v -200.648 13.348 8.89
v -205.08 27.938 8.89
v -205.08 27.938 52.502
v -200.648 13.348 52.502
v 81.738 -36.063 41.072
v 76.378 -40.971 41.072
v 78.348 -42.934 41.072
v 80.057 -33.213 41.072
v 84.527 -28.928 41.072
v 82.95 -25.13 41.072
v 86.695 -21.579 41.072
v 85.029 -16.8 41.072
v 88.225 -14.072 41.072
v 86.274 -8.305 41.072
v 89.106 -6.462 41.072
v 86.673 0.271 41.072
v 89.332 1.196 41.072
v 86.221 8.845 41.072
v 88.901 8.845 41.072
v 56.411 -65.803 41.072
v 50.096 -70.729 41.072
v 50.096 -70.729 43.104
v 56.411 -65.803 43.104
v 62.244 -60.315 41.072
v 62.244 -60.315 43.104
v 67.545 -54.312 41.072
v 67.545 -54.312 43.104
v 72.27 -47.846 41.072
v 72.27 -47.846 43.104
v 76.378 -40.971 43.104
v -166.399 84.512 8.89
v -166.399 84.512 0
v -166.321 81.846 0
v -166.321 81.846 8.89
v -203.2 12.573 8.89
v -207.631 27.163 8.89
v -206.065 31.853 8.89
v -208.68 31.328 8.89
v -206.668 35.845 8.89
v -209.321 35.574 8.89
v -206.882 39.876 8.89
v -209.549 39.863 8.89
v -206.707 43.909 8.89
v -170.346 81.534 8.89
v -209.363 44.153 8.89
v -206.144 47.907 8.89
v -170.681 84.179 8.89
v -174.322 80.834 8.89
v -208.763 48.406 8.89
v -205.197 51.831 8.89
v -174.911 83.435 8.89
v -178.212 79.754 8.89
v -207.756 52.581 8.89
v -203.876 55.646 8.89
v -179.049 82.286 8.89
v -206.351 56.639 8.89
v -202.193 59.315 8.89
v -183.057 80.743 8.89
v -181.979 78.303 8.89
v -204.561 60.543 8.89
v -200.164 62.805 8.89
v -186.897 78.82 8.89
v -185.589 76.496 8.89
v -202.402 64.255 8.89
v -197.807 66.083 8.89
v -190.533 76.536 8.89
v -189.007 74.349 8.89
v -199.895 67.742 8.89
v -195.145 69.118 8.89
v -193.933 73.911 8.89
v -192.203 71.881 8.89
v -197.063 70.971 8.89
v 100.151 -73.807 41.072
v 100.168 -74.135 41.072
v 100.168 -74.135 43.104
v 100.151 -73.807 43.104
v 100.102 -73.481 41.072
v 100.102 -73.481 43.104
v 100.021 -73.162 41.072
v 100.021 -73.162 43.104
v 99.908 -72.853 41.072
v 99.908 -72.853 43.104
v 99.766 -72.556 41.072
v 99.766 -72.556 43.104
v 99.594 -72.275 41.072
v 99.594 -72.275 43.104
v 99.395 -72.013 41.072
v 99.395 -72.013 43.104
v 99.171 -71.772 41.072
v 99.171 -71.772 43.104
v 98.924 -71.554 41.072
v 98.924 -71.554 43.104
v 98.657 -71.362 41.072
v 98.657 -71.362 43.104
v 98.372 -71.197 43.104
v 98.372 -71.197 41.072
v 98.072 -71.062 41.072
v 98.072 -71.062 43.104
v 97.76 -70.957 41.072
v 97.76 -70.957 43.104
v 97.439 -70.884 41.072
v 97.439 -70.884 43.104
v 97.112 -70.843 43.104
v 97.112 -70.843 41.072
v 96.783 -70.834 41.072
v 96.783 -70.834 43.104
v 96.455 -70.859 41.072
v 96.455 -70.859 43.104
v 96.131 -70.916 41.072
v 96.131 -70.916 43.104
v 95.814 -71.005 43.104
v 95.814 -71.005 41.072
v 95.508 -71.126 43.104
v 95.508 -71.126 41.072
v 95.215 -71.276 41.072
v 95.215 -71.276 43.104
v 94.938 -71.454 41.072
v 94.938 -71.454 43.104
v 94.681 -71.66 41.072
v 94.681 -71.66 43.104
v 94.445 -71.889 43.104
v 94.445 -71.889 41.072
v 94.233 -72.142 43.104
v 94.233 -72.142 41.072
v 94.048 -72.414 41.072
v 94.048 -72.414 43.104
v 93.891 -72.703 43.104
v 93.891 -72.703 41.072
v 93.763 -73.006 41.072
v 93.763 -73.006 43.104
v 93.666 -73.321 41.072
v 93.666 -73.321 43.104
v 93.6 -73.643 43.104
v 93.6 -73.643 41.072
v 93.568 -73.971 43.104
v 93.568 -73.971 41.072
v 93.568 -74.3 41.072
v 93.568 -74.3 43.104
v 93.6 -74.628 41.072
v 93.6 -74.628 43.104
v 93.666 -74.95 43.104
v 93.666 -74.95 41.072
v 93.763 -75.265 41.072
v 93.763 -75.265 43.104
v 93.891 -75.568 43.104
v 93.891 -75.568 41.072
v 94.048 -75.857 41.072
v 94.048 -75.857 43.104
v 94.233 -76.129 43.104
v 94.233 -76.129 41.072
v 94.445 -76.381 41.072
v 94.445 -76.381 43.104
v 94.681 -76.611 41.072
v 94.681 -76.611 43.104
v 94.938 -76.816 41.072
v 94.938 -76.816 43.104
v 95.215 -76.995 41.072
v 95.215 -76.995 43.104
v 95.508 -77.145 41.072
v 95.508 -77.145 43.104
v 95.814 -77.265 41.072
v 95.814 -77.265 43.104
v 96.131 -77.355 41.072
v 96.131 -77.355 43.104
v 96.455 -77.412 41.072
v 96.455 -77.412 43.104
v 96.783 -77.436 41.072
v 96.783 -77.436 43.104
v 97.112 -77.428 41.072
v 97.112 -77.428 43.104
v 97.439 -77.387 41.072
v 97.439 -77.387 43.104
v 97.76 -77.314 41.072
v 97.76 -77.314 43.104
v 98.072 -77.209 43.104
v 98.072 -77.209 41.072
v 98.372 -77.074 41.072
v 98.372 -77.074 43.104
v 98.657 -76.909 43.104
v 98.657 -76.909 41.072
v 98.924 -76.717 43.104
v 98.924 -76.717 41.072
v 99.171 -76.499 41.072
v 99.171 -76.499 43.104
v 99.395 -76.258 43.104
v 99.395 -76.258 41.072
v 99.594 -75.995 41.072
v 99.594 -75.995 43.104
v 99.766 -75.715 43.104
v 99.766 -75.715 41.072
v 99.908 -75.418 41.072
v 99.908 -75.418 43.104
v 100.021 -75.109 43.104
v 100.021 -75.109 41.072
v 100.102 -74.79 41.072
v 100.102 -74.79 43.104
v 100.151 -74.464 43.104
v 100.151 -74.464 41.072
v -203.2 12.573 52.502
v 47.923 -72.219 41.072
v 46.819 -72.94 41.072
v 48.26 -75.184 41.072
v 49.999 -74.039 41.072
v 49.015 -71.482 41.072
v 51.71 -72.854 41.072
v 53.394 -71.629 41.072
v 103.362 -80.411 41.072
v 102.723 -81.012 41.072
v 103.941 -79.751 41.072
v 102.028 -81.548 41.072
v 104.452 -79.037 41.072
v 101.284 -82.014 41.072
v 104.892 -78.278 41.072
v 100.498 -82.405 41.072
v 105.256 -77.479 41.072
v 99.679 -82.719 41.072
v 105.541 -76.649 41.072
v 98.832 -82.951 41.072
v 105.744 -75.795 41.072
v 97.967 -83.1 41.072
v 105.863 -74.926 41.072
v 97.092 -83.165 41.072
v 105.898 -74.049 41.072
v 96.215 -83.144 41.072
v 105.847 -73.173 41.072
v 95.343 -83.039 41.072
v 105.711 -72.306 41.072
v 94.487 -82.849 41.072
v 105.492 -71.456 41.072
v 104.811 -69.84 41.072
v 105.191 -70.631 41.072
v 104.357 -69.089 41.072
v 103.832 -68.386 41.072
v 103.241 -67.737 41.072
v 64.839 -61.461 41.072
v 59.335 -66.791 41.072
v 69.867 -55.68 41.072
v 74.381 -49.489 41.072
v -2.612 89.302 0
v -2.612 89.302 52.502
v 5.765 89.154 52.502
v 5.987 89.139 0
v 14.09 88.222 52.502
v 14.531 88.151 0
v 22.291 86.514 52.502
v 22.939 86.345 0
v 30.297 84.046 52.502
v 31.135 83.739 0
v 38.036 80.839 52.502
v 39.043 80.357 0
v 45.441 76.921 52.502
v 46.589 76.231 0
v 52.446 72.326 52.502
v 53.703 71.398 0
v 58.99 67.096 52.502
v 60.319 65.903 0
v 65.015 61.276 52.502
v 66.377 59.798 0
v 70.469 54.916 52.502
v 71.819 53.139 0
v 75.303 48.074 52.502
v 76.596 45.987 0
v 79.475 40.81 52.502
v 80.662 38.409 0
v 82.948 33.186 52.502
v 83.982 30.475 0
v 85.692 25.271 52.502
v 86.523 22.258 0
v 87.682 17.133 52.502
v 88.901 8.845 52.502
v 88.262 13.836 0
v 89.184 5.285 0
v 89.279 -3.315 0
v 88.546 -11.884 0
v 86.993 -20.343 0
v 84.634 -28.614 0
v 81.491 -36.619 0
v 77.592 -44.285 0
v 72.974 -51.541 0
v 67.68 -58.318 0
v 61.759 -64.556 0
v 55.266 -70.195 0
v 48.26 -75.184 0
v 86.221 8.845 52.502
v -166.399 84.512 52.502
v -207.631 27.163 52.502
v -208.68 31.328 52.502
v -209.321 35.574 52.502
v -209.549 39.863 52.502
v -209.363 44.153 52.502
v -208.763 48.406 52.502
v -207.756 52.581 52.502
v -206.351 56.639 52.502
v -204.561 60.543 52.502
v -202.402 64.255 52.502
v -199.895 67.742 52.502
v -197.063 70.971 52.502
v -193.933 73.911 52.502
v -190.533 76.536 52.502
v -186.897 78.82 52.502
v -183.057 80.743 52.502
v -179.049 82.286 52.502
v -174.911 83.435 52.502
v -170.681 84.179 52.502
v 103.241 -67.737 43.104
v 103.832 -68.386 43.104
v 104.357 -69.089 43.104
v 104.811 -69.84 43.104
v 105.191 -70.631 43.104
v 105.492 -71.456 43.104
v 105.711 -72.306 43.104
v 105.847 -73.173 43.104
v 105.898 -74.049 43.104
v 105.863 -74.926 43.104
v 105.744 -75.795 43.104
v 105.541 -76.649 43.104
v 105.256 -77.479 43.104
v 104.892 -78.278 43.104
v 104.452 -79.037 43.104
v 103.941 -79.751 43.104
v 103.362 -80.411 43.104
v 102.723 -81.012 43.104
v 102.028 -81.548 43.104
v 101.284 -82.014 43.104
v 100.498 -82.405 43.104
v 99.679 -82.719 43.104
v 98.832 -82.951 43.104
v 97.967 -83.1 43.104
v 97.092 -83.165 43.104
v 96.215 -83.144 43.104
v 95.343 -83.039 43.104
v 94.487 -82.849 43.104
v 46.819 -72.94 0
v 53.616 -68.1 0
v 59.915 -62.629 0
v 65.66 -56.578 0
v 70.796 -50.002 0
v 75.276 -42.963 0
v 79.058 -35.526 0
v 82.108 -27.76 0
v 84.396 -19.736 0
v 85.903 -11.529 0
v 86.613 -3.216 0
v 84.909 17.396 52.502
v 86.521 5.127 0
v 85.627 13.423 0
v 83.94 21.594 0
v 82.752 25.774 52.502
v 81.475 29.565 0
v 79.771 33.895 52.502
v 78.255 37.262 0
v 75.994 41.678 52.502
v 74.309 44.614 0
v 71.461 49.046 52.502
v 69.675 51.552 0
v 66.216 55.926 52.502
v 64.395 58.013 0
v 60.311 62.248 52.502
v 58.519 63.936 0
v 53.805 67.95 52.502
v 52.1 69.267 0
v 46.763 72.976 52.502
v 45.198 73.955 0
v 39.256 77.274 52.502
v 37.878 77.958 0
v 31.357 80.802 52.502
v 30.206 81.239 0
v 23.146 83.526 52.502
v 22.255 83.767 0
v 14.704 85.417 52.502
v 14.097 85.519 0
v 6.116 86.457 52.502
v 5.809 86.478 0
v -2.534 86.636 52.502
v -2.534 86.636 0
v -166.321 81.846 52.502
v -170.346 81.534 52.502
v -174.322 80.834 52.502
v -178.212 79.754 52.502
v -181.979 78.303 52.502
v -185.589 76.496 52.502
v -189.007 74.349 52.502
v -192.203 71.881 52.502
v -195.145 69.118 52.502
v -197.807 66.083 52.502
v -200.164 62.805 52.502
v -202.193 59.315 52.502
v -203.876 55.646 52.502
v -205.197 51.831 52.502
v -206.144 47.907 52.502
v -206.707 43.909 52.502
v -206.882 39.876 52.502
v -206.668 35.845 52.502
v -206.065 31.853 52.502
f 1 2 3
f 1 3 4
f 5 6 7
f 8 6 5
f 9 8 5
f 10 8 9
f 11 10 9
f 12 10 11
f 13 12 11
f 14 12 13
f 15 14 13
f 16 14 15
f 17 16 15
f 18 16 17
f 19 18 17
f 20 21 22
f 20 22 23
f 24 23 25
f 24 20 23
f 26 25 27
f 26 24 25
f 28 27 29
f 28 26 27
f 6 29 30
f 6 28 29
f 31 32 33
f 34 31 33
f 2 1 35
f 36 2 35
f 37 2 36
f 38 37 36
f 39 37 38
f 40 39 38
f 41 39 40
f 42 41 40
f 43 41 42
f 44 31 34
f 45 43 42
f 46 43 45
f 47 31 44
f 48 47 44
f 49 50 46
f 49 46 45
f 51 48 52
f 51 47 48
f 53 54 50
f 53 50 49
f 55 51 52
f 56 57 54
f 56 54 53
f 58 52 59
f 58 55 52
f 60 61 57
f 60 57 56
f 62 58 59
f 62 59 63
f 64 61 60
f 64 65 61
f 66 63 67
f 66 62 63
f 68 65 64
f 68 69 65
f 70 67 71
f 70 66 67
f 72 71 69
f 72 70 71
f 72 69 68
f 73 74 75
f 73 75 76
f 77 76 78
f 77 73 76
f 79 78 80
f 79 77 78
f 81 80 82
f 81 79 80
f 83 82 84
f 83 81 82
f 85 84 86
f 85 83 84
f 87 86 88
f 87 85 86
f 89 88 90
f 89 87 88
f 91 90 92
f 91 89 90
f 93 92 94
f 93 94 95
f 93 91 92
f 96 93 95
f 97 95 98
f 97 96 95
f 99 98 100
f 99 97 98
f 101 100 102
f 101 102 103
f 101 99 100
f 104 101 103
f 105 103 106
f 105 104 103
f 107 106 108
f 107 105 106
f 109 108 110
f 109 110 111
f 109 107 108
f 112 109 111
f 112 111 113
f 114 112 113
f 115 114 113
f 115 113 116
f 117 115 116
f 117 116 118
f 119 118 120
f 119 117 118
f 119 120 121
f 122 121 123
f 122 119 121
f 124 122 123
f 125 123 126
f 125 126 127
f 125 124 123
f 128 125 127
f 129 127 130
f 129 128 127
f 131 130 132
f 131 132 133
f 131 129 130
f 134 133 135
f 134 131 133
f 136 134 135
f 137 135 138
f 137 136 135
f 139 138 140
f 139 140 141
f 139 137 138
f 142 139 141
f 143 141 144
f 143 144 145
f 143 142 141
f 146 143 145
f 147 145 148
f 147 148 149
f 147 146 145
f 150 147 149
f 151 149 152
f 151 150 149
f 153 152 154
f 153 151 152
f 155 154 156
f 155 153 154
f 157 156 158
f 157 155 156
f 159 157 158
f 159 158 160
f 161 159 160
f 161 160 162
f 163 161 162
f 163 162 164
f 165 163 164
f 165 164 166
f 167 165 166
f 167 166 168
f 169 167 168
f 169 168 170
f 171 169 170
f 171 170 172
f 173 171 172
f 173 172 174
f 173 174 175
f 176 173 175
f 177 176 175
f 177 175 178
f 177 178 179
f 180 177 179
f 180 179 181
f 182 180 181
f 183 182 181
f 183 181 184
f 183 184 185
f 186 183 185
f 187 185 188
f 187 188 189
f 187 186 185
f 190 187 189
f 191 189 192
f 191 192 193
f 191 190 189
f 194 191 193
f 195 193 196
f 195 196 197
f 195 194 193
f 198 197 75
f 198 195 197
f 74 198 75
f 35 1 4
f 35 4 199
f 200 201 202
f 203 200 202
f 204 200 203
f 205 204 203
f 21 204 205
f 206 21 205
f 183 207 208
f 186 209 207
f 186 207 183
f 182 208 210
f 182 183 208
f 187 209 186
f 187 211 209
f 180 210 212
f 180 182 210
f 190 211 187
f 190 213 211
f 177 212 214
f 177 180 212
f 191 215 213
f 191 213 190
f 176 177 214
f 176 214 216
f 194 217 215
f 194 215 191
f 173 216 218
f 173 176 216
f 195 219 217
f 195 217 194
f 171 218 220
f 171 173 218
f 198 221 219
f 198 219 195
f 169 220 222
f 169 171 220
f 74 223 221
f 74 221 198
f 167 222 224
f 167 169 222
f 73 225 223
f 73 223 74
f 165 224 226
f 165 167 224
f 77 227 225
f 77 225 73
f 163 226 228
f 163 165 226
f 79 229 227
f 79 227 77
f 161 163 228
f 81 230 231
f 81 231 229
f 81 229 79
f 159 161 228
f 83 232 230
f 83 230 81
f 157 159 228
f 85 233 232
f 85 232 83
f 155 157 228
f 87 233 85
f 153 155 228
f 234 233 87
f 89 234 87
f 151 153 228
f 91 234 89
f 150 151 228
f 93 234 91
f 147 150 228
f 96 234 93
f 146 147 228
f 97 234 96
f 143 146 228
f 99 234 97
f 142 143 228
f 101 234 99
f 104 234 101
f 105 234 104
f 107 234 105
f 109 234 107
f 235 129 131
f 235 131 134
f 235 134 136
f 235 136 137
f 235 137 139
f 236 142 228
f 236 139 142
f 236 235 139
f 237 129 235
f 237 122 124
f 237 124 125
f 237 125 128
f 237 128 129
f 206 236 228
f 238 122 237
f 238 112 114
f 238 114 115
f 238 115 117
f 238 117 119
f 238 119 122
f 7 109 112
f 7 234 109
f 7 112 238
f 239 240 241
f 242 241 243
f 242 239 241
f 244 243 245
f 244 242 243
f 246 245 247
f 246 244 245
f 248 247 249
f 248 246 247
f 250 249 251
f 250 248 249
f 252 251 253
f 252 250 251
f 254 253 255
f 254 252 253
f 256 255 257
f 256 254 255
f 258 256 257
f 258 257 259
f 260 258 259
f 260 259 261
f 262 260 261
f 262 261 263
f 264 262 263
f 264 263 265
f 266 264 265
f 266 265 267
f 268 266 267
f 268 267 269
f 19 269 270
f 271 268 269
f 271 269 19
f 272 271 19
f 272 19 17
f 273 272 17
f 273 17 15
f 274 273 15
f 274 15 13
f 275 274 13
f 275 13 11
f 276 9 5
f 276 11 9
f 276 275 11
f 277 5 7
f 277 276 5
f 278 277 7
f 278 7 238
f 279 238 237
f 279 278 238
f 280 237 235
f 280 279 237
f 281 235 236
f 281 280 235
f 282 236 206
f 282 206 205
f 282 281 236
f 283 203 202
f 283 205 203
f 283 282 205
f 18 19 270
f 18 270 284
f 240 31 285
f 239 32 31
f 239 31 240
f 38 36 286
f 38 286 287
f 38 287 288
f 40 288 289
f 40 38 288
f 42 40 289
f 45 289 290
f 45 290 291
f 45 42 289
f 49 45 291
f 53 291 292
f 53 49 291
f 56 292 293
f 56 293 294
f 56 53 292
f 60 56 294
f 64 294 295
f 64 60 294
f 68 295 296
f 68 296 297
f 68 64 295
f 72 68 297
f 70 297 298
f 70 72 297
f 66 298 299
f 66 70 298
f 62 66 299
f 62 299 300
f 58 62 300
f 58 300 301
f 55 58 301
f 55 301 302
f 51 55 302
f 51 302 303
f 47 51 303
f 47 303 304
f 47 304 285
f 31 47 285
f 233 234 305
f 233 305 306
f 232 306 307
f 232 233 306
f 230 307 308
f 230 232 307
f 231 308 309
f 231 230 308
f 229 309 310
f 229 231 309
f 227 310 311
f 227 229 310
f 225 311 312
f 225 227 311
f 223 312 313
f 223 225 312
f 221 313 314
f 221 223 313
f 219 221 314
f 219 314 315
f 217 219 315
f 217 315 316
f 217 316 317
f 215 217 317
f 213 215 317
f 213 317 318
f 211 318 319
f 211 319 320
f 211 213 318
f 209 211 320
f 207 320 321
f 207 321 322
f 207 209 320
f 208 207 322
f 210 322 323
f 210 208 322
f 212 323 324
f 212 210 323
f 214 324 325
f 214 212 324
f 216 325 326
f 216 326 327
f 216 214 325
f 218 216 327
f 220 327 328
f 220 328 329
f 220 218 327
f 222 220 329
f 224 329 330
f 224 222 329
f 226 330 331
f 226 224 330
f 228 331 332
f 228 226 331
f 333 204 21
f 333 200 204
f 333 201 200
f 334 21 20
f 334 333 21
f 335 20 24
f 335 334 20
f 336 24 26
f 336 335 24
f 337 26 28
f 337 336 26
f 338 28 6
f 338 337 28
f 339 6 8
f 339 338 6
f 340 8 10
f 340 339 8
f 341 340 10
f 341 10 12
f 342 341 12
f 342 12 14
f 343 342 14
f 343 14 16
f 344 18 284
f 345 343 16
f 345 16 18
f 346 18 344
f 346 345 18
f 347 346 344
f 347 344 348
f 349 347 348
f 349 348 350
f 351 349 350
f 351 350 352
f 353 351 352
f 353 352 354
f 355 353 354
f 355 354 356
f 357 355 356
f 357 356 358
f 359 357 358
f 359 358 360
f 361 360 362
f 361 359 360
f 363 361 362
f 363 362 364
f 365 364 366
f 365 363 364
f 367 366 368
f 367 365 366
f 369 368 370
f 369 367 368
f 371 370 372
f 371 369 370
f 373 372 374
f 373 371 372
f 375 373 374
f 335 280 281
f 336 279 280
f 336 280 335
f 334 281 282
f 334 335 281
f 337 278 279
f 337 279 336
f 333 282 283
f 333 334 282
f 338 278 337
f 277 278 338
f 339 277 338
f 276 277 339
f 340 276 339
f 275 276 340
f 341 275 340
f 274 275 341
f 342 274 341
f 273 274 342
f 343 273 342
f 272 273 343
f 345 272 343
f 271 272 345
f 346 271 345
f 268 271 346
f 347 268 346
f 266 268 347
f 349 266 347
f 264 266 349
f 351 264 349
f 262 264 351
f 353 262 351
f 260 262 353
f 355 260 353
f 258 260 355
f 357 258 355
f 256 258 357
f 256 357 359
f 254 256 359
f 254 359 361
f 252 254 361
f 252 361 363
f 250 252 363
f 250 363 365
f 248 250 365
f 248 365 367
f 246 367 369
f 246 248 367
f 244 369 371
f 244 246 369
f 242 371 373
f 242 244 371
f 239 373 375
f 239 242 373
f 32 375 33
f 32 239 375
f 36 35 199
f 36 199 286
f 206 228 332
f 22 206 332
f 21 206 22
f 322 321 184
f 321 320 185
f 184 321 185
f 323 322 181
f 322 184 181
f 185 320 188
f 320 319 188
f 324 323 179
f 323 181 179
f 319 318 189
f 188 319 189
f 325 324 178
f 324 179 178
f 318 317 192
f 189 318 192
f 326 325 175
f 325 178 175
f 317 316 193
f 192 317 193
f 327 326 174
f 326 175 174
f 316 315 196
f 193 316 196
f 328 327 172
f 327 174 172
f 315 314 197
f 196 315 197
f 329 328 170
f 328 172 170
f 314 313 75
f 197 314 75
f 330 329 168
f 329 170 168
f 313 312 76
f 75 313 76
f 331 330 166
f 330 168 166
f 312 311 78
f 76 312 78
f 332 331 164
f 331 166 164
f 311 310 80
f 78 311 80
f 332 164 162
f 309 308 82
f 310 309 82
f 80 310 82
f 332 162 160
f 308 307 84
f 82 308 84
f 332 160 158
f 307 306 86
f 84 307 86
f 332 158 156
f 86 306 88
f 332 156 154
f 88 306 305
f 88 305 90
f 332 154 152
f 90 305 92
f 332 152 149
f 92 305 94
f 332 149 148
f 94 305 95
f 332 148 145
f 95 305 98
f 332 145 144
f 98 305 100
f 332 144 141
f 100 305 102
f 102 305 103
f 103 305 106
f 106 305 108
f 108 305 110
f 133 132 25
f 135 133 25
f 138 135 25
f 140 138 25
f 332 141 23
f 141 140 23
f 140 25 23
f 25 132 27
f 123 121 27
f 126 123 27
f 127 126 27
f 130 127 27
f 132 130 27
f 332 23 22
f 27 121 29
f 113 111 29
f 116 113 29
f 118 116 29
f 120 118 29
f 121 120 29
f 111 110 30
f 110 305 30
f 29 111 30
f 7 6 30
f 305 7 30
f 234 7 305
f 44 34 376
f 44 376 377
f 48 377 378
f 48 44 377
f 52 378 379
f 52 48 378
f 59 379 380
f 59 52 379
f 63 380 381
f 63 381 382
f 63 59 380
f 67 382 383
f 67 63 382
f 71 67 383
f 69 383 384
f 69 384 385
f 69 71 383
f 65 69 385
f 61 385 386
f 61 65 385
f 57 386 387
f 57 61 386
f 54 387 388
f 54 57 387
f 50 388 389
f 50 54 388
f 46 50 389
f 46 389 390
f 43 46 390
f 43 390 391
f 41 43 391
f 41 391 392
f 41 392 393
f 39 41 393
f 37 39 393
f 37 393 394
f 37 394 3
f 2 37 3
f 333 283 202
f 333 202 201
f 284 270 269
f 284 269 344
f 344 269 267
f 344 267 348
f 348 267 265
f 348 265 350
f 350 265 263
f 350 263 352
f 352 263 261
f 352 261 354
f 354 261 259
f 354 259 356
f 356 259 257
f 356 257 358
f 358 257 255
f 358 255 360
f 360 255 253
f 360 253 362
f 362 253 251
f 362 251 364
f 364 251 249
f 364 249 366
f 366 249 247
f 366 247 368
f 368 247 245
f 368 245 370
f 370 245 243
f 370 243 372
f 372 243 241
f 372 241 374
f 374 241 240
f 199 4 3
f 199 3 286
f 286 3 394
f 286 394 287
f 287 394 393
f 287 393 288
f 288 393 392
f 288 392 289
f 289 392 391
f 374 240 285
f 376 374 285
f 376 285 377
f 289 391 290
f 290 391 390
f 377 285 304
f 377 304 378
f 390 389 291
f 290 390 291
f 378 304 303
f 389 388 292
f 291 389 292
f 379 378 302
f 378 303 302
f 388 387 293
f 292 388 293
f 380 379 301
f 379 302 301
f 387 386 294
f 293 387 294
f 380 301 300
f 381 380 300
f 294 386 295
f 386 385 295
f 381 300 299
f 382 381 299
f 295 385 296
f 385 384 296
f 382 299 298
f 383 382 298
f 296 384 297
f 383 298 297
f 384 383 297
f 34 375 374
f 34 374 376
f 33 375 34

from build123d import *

# Parameters (mm, degrees)
BASE_FLANGE1_DEPTH  = 52.5018
CUT_EXTRUDE1_DEPTH  = 8.89
CUT_EXTRUDE2_START  = -11.43
CUT_EXTRUDE2_DEPTH  = 11.43
SKETCH10_R          = 3.302
BOSS_EXTRUDE2_DEPTH = 2.032


# Sheet-metal steps are written as plain solids
with BuildPart() as part:
    # Sketch2 → Base-Flange1 (new body)
    with BuildSketch(Plane.XY):
        with BuildLine():
            Line((-203.2, 12.573), (-207.631458356, 27.163090613))
            ThreePointArc((-207.631458356, 27.163090613), (-201.190368302, 66.028990192), (-166.399327165, 84.512205491))
            Line((-166.399327165, 84.512205491), (-2.61152029, 89.301967603))
            ThreePointArc((-2.61152029, 89.301967603), (85.351357983, 26.397104888), (48.26, -75.184))
            Line((48.26, -75.184), (46.819332757, -72.939592084))
            ThreePointArc((46.819332757, -72.939592084), (82.803432048, 25.609093195), (-2.533560661, 86.636107274))
            Line((-2.533560661, 86.636107274), (-166.321367535, 81.846345161))
            ThreePointArc((-166.321367535, 81.846345161), (-199.024946204, 64.47212278), (-205.079570854, 27.938177176))
            Line((-205.079570854, 27.938177176), (-200.648112499, 13.348086563))
            Line((-200.648112499, 13.348086563), (-203.2, 12.573))
        make_face()
    extrude(amount=BASE_FLANGE1_DEPTH)

    # Sketch7 → Cut-Extrude1 (cut)
    with BuildSketch(Plane(origin=(0, 0, 0), x_dir=(-1, 0, 0), z_dir=(0, 0, -1))):
        with BuildLine():
            Line((166.399327165, 84.512205491), (166.321367535, 81.846345161))
            ThreePointArc((166.321367535, 81.846345161), (199.024946204, 64.47212278), (205.079570854, 27.938177176))
            Line((205.079570854, 27.938177176), (200.648112499, 13.348086563))
            Line((200.648112499, 13.348086563), (203.2, 12.573))
            Line((203.2, 12.573), (207.631458356, 27.163090613))
            ThreePointArc((207.631458356, 27.163090613), (201.190368302, 66.028990192), (166.399327165, 84.512205491))
        make_face()
    extrude(amount=-CUT_EXTRUDE1_DEPTH, mode=Mode.SUBTRACT)

    # Sketch9 → Cut-Extrude2 (cut)
    with BuildSketch(Plane.XY.offset(52.5018).offset(CUT_EXTRUDE2_START)):
        with BuildLine():
            Line((46.819332757, -72.939592084), (48.26, -75.184))
            ThreePointArc((48.26, -75.184), (80.427121635, -38.89909461), (88.901213224, 8.845097132))
            Line((88.901213224, 8.845097132), (86.220637146, 8.845097132))
            ThreePointArc((86.220637146, 8.845097132), (78.083879549, -37.618370083), (46.819332757, -72.939592084))
        make_face()
    extrude(amount=CUT_EXTRUDE2_DEPTH, mode=Mode.SUBTRACT)

    # Sketch10 → Boss-Extrude2 (add)
    with BuildSketch(Plane.XY.offset(41.0718)):
        with BuildLine():
            Line((76.378066867, -40.971025307), (103.240982904, -67.736900681))
            ThreePointArc((103.240982904, -67.736900681), (104.68136366, -78.663063475), (94.486544869, -82.848920608))
            Line((94.486544869, -82.848920608), (50.096351047, -70.728987162))
            ThreePointArc((50.096351047, -70.728987162), (64.964056756, -57.375128261), (76.378066867, -40.971025307))
        make_face()
        with Locations((96.865618573, -74.135379129)):
            Circle(SKETCH10_R, mode=Mode.SUBTRACT)
    extrude(amount=BOSS_EXTRUDE2_DEPTH)


solid = part.part
